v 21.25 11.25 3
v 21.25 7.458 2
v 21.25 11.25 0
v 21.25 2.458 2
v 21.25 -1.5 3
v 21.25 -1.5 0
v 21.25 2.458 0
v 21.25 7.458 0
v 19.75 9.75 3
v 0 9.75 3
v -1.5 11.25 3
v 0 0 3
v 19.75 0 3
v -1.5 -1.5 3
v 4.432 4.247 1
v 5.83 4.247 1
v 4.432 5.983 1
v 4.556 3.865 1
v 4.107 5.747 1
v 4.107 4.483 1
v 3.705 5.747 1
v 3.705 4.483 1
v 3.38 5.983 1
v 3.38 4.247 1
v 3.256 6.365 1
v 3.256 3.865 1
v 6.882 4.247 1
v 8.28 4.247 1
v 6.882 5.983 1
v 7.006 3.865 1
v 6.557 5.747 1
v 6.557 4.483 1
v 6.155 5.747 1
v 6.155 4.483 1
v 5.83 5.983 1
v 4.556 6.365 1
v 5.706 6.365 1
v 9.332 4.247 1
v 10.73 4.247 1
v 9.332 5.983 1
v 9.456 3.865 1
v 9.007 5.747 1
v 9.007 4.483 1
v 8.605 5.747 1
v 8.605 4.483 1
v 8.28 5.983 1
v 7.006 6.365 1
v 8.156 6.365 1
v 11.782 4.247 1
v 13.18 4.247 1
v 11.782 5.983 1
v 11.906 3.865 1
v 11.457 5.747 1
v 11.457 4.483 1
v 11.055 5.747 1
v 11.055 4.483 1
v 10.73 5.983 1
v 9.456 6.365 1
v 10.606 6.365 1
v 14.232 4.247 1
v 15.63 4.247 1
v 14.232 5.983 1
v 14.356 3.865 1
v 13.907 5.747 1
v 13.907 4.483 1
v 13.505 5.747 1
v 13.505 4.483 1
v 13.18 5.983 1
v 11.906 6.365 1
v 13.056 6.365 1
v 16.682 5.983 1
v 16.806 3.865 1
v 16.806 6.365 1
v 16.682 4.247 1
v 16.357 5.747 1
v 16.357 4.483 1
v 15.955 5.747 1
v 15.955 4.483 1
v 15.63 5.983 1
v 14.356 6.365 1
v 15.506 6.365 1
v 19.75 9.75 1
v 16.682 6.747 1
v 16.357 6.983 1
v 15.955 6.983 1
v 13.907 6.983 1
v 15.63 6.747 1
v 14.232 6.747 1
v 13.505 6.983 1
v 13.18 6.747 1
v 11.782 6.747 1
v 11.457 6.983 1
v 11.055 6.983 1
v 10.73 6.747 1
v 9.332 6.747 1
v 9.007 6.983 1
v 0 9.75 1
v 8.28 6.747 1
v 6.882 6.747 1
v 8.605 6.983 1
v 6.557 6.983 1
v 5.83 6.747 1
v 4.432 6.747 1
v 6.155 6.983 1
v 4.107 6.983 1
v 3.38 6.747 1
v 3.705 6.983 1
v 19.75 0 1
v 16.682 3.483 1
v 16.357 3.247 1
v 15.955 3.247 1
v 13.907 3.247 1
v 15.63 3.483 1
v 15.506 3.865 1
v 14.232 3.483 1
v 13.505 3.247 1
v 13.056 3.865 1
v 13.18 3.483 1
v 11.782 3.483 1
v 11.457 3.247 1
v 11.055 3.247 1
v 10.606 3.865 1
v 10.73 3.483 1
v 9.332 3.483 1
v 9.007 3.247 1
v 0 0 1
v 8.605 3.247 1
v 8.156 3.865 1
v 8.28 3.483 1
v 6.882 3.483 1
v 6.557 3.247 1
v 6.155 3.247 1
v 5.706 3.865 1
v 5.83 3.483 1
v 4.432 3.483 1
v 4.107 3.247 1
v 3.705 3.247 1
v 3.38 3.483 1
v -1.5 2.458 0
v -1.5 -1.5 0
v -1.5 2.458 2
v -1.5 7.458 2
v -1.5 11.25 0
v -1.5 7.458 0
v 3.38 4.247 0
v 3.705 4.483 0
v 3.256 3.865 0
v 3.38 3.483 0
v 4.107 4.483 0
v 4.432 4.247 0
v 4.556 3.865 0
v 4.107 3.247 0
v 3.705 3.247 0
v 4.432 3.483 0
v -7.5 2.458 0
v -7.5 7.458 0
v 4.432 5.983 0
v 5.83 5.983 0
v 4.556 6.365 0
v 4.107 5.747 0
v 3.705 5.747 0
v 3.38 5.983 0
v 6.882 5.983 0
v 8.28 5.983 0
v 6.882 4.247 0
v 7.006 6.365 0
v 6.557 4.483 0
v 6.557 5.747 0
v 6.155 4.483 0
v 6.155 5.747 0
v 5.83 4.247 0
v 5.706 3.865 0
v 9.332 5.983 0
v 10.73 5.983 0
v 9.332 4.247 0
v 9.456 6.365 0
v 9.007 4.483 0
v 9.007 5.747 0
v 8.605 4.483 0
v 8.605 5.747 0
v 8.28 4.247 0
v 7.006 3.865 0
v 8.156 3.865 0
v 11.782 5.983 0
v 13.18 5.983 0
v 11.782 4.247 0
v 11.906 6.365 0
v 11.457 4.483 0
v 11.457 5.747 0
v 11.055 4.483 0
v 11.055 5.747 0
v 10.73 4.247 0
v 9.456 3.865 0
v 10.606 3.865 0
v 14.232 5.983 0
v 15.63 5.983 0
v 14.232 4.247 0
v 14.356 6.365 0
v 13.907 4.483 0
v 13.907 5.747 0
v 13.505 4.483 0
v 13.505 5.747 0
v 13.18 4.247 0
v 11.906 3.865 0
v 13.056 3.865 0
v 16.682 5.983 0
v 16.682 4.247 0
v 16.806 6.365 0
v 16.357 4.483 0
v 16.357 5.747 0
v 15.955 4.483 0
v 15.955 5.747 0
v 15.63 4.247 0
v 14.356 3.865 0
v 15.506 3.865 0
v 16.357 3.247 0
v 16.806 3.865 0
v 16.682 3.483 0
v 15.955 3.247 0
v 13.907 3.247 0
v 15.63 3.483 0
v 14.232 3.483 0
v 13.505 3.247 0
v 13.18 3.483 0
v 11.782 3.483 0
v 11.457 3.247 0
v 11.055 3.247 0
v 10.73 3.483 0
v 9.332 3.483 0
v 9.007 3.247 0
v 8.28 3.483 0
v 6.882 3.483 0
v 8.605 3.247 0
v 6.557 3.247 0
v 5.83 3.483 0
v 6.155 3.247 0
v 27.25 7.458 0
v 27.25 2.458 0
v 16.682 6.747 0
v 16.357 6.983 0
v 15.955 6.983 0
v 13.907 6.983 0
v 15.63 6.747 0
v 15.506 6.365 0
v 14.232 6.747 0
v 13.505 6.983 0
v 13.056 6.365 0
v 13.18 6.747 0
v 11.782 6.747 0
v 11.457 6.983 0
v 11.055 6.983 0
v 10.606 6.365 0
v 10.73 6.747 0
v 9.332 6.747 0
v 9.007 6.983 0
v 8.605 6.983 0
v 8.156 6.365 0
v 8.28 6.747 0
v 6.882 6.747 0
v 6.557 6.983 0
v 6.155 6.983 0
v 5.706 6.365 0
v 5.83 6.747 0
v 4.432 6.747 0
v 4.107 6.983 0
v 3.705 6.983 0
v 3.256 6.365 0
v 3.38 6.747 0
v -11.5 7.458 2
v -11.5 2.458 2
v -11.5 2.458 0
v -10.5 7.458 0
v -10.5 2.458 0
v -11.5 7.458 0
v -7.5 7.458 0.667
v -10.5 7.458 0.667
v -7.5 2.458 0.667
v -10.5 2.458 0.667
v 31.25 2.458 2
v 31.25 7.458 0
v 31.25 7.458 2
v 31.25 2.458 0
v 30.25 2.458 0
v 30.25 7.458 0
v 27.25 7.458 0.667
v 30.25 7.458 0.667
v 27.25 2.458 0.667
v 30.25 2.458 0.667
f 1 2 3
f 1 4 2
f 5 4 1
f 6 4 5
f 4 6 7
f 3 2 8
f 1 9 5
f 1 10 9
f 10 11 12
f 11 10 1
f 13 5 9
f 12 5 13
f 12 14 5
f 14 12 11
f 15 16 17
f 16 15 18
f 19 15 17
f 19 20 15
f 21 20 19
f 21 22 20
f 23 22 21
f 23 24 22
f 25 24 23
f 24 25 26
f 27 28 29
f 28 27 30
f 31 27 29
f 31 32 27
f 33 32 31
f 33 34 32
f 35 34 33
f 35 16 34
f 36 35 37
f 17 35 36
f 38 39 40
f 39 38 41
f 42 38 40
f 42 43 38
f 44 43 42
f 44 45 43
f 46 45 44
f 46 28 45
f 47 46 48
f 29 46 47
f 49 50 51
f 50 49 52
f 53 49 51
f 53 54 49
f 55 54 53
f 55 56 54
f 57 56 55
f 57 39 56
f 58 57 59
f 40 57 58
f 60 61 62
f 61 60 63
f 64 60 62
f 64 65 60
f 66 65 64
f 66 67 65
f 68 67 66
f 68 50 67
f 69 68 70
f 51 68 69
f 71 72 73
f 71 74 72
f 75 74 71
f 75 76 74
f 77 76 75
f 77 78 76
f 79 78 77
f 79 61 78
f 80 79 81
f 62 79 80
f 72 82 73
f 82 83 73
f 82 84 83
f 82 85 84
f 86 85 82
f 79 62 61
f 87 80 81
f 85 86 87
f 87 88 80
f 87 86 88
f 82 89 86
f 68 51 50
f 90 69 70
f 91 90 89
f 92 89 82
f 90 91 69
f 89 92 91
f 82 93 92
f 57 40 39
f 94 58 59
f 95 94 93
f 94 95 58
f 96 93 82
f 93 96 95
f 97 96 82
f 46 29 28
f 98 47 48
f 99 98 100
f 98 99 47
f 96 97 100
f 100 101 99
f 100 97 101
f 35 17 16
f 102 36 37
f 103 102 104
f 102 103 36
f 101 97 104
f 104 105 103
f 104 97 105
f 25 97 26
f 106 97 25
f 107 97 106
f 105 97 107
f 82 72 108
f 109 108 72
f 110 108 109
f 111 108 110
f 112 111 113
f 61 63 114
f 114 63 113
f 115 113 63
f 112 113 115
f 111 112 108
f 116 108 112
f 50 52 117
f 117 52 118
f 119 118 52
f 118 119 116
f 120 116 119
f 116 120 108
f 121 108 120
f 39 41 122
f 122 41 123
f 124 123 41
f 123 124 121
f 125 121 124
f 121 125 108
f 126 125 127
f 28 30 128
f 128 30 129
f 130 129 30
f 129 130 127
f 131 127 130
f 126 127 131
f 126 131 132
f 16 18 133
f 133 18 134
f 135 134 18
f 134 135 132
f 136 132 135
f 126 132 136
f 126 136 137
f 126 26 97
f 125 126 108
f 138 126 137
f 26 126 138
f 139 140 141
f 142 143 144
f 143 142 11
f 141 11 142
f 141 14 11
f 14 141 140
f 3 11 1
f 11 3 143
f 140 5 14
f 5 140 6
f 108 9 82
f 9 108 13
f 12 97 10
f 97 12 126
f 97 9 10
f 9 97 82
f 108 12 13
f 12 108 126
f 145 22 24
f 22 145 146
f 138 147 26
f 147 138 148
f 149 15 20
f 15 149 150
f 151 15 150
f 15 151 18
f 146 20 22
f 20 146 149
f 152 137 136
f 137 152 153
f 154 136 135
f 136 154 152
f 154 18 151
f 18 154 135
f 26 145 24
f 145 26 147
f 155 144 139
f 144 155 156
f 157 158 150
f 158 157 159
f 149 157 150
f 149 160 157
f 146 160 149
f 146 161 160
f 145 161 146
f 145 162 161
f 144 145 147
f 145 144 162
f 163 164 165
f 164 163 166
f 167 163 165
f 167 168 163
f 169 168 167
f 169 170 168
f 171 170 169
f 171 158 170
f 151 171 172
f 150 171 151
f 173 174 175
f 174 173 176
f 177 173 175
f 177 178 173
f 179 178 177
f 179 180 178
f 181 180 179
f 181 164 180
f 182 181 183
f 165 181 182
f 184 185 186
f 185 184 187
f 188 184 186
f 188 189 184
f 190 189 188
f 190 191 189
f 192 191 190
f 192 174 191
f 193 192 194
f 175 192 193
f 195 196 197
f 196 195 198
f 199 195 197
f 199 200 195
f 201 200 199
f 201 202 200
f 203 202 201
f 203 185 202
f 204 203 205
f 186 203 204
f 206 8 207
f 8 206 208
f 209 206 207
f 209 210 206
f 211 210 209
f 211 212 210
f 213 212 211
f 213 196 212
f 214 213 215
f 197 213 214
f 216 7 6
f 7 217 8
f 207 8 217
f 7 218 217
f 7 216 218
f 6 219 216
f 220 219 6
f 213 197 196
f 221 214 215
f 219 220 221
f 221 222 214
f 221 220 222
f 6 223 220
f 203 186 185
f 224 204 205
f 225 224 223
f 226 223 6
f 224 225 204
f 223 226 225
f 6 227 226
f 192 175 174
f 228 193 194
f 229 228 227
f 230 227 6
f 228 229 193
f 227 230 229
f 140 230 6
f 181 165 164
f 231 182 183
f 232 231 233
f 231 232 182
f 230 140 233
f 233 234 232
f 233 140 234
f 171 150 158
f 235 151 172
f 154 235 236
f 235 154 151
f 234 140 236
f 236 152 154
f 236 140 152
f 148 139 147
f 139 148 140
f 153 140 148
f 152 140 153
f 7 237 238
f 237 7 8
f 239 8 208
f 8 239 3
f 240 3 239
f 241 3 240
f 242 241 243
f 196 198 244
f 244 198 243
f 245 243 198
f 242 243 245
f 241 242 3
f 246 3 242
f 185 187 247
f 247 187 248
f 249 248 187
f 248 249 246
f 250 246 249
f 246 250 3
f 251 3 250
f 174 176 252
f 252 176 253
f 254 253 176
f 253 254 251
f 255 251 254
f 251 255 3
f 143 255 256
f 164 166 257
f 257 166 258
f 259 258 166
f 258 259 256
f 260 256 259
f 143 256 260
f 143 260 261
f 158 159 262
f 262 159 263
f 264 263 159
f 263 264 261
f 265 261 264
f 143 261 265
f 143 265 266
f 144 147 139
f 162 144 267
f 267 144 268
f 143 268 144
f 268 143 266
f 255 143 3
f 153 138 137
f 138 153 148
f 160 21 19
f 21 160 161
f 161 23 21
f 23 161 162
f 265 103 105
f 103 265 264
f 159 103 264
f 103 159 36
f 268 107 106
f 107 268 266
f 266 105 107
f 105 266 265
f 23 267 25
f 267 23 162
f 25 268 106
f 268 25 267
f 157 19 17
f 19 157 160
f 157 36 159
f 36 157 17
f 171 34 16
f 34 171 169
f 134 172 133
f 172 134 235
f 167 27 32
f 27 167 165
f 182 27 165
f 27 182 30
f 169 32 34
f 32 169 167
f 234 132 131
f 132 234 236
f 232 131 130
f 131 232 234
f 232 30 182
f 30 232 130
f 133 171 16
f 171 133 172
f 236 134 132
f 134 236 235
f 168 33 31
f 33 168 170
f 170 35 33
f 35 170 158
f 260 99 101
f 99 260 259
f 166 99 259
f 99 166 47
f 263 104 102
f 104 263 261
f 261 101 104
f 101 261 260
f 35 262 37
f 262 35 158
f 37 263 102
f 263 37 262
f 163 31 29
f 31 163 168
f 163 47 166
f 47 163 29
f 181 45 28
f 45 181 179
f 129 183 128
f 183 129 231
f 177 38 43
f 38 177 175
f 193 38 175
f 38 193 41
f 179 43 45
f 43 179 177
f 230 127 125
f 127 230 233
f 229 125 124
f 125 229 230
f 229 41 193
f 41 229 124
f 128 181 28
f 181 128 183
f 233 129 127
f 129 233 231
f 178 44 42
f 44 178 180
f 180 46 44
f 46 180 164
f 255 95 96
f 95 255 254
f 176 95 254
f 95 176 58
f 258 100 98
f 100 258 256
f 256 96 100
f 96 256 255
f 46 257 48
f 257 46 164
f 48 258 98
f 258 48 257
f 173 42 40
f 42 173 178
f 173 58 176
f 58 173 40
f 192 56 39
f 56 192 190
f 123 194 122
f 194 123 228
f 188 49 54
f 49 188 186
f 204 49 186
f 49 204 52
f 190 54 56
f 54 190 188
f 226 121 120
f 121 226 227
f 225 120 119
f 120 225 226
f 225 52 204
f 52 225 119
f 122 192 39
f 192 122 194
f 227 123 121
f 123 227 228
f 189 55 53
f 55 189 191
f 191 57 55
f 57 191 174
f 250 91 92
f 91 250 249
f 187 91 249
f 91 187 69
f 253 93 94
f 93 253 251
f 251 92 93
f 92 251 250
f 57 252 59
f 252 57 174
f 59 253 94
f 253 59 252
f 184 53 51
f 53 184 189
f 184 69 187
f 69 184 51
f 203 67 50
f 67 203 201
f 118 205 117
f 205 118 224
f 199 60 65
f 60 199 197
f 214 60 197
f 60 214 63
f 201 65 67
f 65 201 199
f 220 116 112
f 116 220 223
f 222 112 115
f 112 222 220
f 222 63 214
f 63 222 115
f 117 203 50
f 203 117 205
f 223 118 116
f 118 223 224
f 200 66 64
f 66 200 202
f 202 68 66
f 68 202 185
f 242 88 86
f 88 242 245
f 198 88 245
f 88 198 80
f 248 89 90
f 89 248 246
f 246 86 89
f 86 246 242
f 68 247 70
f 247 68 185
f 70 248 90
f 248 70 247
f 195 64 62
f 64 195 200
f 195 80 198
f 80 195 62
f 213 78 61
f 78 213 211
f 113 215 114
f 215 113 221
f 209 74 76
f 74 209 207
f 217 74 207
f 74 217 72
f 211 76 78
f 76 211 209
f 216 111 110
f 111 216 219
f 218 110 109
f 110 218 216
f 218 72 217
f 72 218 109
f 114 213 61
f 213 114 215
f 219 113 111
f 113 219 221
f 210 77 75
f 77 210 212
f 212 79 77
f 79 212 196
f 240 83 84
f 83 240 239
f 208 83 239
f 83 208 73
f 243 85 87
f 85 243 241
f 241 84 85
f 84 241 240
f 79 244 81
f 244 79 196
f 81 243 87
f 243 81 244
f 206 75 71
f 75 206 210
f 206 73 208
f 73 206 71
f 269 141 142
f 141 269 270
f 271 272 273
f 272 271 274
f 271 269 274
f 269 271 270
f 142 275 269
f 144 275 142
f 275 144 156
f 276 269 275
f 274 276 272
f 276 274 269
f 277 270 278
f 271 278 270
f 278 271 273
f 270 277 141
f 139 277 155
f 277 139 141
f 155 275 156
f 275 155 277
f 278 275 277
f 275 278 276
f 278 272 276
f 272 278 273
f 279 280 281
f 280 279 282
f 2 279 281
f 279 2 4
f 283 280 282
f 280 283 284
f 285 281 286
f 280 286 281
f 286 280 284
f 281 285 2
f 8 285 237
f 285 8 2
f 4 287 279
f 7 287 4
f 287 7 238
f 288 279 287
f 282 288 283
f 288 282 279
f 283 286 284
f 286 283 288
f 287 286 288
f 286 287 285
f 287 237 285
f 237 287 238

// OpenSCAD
terminal_width = 1.35;
terminal_length = 3.95;
terminal_height = 1;
terminal_spacing = 1.1;

total_terminal_width = (terminal_width*6) + (terminal_spacing*5);

block_width = 19.75;
block_length = 9.75;
block_height = 2;

module terminal_contact() {
  translate([terminal_width/2, terminal_length/2, 0]) {
    translate([0,-1.25,0]) cylinder(d=1.3, h=block_height, $fn=10);
    translate([0,1.25,0]) cylinder(d=1.3, h=block_height, $fn=10);
  }
}

translate([0,0,terminal_height]) {
  difference() {
    translate([-1.5,-1.5,0]) cube([block_width+3, block_length+3, block_height]);
    cube([block_width, block_length, block_height]);
  }
}

translate([-1.5,-1.5,0]) {
  difference() {
    cube([block_width+3, block_length+3, terminal_height]);

    translate([(block_width-total_terminal_width)/1.3, (block_length-terminal_length)/1.25, 0]) {
      for (terminal_number = [0:5]) {
        if (terminal_number > 0 ) {
          translate([(terminal_number*terminal_width)+(terminal_number*terminal_spacing), 0, 0])
            terminal_contact();
        } else {
          terminal_contact();
        }
      }
    }
  }
}

retainer_length = 10;
retainer_width = 5;
retainer_height = terminal_height*2;

translate([-retainer_length-1.5, (block_width-retainer_width)/6, 0]) {
  difference() {
    cube([retainer_length, retainer_width, retainer_height]);
    translate([1,0,0]) cube([3, retainer_width, retainer_height/3]);
  }
}
translate([block_length+retainer_length+1.5, (block_width-retainer_width)/6, 0]) {
  difference() {
    cube([retainer_length, retainer_width, retainer_height]);
    translate([retainer_length-4,0,0]) cube([3, retainer_width, retainer_height/3]);
  }
}
